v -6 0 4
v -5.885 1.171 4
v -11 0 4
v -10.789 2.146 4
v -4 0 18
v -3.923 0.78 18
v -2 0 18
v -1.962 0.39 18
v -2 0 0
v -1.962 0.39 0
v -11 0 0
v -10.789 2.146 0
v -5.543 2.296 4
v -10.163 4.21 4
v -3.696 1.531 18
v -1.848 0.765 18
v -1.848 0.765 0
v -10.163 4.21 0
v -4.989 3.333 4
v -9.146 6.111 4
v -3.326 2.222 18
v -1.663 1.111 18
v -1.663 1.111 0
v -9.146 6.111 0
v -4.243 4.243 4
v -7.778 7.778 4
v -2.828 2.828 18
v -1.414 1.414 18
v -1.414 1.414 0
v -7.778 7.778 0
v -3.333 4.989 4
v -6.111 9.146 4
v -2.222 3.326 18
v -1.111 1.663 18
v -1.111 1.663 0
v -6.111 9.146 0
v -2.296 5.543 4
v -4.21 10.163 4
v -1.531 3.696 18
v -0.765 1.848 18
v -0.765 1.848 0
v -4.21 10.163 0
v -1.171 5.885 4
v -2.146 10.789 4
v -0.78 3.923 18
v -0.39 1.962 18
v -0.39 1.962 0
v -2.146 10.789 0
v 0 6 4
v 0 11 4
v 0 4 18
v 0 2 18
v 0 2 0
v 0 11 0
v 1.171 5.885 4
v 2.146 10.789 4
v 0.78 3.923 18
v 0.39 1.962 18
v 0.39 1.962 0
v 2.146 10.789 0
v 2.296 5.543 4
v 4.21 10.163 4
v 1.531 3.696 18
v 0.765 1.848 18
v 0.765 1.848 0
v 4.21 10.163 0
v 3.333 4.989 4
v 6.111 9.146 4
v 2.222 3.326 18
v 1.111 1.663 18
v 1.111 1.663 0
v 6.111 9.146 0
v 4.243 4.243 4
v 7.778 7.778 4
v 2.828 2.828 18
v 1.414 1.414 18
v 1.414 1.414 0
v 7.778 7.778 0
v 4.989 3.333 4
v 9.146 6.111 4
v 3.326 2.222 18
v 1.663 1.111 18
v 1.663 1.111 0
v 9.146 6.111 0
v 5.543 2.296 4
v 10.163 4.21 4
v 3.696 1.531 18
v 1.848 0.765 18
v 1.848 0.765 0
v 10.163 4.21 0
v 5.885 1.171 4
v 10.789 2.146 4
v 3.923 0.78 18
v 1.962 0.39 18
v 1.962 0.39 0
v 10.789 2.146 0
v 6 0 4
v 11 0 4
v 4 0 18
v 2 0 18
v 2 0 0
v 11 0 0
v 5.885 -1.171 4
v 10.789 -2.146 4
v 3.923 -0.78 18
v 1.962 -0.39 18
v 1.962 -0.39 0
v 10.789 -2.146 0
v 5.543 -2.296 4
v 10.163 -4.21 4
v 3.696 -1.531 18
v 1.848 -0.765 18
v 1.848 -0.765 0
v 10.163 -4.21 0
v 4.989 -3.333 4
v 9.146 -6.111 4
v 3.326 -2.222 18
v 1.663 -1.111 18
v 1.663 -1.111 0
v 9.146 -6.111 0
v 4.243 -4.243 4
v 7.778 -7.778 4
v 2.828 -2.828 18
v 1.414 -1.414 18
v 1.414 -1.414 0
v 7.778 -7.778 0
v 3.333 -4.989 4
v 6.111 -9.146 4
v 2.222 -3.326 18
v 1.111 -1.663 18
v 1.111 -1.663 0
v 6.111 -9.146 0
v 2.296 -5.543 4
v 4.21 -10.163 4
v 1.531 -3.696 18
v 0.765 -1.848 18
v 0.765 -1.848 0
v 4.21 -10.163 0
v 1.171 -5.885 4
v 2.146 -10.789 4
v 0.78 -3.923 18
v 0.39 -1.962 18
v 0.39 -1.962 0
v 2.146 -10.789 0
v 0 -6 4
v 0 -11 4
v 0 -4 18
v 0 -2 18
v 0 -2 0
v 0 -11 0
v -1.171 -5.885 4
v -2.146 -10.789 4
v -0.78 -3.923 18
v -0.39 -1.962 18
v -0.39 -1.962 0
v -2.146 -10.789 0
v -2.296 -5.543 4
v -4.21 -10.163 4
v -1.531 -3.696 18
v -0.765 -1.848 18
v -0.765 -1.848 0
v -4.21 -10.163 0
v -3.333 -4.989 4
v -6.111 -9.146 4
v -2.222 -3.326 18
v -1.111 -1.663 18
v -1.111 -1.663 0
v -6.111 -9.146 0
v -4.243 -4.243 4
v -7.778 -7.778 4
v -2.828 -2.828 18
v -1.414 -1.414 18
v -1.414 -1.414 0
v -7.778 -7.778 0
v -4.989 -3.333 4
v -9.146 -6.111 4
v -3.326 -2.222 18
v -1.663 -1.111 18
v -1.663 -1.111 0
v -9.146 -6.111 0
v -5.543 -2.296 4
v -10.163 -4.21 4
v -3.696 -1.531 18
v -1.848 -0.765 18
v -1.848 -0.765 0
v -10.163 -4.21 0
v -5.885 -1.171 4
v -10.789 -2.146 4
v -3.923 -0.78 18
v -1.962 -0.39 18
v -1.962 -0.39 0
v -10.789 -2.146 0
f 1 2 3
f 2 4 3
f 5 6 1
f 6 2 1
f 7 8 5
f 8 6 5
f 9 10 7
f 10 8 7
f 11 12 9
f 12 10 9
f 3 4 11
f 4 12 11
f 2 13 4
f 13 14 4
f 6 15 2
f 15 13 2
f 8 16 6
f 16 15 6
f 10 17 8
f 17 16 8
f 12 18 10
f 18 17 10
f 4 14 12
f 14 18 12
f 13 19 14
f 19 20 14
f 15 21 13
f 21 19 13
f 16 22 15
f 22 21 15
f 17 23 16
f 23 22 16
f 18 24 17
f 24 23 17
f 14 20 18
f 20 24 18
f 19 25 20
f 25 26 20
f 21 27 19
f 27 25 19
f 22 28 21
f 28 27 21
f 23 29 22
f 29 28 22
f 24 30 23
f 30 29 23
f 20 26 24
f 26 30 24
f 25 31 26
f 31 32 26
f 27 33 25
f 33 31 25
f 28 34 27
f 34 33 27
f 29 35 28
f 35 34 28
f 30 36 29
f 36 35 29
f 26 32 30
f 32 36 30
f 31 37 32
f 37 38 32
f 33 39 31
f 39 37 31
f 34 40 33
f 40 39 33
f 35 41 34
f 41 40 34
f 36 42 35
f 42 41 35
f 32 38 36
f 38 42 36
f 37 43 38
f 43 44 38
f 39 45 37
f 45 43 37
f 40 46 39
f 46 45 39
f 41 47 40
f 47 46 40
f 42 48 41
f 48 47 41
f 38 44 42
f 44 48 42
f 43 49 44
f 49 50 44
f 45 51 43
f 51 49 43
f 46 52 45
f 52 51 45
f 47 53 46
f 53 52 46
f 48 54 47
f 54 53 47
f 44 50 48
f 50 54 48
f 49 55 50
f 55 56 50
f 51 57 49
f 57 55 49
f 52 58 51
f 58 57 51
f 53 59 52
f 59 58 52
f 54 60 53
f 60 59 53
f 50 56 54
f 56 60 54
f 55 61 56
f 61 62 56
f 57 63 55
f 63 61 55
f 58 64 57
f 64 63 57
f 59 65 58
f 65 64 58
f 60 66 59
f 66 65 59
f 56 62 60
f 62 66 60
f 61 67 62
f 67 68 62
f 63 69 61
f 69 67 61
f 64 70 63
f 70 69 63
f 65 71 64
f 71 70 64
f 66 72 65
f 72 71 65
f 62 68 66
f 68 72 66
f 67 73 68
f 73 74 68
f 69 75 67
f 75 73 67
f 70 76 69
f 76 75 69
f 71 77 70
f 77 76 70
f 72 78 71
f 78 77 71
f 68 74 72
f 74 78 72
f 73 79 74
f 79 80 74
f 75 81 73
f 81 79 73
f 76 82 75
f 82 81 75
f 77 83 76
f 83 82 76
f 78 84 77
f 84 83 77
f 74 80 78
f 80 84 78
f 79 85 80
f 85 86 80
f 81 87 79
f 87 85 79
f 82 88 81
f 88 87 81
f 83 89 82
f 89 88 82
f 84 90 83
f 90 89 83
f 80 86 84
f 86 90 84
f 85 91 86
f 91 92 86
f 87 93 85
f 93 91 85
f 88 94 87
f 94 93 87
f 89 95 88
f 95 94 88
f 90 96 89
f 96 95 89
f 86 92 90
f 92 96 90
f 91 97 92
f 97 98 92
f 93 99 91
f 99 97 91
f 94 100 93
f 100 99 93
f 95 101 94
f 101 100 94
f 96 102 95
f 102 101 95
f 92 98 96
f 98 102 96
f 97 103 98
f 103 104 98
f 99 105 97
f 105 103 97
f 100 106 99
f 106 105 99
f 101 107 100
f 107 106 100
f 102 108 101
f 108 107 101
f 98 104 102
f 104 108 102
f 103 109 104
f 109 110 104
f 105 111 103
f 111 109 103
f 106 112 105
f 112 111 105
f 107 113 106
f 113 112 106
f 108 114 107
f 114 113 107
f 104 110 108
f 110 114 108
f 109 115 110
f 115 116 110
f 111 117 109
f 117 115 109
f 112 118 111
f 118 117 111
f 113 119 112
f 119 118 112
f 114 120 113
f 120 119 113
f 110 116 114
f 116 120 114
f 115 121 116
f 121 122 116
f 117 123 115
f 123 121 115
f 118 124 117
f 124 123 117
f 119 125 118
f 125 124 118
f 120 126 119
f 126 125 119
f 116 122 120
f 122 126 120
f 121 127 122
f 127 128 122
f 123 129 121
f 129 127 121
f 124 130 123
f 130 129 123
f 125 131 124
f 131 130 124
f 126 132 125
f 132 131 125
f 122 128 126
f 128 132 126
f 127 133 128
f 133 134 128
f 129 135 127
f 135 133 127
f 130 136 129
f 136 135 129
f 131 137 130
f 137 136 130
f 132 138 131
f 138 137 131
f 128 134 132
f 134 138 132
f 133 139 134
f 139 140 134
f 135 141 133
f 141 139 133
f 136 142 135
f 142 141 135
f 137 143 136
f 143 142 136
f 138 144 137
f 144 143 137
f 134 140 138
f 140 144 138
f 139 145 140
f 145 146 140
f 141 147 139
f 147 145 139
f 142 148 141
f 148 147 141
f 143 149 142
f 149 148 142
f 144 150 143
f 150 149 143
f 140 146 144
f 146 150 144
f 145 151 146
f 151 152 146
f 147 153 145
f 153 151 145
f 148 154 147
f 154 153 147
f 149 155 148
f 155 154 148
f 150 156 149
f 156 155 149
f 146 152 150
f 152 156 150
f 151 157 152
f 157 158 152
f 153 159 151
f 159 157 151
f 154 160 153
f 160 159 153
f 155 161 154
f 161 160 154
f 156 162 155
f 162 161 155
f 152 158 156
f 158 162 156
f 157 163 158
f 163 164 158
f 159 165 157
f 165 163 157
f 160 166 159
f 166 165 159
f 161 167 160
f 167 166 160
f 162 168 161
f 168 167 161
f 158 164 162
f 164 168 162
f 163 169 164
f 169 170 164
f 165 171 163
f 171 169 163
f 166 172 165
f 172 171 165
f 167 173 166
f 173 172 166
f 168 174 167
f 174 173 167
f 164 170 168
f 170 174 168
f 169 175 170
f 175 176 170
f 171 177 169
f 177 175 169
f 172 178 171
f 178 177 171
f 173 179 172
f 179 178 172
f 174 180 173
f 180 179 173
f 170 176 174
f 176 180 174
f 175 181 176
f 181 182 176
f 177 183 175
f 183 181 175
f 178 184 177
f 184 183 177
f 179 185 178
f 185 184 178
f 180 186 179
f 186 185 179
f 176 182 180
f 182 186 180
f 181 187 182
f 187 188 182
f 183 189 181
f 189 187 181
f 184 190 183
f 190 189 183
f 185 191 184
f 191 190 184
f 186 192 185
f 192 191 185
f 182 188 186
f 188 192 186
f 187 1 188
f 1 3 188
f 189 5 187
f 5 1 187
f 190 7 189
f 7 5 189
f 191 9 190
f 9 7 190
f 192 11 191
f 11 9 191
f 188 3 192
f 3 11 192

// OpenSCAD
$fn = 32;

// ----------------------------------------------------------------------
// Profiled standoff: conical spacer, 18 mm long, bore 4 mm
// ----------------------------------------------------------------------

// --- parameters (mm) ---
revolve_angle = 360;      // full turn around the Z axis
profile_points = 6;       // points of the closed outline

profile = [[2, 0], [11, 0], [11, 4], [6, 4], [4, 18], [2, 18]];  // single closed polygon, 6 points, counter clockwise

// --- the one profile operation ---
rotate_extrude(angle = revolve_angle) polygon(points = profile);
